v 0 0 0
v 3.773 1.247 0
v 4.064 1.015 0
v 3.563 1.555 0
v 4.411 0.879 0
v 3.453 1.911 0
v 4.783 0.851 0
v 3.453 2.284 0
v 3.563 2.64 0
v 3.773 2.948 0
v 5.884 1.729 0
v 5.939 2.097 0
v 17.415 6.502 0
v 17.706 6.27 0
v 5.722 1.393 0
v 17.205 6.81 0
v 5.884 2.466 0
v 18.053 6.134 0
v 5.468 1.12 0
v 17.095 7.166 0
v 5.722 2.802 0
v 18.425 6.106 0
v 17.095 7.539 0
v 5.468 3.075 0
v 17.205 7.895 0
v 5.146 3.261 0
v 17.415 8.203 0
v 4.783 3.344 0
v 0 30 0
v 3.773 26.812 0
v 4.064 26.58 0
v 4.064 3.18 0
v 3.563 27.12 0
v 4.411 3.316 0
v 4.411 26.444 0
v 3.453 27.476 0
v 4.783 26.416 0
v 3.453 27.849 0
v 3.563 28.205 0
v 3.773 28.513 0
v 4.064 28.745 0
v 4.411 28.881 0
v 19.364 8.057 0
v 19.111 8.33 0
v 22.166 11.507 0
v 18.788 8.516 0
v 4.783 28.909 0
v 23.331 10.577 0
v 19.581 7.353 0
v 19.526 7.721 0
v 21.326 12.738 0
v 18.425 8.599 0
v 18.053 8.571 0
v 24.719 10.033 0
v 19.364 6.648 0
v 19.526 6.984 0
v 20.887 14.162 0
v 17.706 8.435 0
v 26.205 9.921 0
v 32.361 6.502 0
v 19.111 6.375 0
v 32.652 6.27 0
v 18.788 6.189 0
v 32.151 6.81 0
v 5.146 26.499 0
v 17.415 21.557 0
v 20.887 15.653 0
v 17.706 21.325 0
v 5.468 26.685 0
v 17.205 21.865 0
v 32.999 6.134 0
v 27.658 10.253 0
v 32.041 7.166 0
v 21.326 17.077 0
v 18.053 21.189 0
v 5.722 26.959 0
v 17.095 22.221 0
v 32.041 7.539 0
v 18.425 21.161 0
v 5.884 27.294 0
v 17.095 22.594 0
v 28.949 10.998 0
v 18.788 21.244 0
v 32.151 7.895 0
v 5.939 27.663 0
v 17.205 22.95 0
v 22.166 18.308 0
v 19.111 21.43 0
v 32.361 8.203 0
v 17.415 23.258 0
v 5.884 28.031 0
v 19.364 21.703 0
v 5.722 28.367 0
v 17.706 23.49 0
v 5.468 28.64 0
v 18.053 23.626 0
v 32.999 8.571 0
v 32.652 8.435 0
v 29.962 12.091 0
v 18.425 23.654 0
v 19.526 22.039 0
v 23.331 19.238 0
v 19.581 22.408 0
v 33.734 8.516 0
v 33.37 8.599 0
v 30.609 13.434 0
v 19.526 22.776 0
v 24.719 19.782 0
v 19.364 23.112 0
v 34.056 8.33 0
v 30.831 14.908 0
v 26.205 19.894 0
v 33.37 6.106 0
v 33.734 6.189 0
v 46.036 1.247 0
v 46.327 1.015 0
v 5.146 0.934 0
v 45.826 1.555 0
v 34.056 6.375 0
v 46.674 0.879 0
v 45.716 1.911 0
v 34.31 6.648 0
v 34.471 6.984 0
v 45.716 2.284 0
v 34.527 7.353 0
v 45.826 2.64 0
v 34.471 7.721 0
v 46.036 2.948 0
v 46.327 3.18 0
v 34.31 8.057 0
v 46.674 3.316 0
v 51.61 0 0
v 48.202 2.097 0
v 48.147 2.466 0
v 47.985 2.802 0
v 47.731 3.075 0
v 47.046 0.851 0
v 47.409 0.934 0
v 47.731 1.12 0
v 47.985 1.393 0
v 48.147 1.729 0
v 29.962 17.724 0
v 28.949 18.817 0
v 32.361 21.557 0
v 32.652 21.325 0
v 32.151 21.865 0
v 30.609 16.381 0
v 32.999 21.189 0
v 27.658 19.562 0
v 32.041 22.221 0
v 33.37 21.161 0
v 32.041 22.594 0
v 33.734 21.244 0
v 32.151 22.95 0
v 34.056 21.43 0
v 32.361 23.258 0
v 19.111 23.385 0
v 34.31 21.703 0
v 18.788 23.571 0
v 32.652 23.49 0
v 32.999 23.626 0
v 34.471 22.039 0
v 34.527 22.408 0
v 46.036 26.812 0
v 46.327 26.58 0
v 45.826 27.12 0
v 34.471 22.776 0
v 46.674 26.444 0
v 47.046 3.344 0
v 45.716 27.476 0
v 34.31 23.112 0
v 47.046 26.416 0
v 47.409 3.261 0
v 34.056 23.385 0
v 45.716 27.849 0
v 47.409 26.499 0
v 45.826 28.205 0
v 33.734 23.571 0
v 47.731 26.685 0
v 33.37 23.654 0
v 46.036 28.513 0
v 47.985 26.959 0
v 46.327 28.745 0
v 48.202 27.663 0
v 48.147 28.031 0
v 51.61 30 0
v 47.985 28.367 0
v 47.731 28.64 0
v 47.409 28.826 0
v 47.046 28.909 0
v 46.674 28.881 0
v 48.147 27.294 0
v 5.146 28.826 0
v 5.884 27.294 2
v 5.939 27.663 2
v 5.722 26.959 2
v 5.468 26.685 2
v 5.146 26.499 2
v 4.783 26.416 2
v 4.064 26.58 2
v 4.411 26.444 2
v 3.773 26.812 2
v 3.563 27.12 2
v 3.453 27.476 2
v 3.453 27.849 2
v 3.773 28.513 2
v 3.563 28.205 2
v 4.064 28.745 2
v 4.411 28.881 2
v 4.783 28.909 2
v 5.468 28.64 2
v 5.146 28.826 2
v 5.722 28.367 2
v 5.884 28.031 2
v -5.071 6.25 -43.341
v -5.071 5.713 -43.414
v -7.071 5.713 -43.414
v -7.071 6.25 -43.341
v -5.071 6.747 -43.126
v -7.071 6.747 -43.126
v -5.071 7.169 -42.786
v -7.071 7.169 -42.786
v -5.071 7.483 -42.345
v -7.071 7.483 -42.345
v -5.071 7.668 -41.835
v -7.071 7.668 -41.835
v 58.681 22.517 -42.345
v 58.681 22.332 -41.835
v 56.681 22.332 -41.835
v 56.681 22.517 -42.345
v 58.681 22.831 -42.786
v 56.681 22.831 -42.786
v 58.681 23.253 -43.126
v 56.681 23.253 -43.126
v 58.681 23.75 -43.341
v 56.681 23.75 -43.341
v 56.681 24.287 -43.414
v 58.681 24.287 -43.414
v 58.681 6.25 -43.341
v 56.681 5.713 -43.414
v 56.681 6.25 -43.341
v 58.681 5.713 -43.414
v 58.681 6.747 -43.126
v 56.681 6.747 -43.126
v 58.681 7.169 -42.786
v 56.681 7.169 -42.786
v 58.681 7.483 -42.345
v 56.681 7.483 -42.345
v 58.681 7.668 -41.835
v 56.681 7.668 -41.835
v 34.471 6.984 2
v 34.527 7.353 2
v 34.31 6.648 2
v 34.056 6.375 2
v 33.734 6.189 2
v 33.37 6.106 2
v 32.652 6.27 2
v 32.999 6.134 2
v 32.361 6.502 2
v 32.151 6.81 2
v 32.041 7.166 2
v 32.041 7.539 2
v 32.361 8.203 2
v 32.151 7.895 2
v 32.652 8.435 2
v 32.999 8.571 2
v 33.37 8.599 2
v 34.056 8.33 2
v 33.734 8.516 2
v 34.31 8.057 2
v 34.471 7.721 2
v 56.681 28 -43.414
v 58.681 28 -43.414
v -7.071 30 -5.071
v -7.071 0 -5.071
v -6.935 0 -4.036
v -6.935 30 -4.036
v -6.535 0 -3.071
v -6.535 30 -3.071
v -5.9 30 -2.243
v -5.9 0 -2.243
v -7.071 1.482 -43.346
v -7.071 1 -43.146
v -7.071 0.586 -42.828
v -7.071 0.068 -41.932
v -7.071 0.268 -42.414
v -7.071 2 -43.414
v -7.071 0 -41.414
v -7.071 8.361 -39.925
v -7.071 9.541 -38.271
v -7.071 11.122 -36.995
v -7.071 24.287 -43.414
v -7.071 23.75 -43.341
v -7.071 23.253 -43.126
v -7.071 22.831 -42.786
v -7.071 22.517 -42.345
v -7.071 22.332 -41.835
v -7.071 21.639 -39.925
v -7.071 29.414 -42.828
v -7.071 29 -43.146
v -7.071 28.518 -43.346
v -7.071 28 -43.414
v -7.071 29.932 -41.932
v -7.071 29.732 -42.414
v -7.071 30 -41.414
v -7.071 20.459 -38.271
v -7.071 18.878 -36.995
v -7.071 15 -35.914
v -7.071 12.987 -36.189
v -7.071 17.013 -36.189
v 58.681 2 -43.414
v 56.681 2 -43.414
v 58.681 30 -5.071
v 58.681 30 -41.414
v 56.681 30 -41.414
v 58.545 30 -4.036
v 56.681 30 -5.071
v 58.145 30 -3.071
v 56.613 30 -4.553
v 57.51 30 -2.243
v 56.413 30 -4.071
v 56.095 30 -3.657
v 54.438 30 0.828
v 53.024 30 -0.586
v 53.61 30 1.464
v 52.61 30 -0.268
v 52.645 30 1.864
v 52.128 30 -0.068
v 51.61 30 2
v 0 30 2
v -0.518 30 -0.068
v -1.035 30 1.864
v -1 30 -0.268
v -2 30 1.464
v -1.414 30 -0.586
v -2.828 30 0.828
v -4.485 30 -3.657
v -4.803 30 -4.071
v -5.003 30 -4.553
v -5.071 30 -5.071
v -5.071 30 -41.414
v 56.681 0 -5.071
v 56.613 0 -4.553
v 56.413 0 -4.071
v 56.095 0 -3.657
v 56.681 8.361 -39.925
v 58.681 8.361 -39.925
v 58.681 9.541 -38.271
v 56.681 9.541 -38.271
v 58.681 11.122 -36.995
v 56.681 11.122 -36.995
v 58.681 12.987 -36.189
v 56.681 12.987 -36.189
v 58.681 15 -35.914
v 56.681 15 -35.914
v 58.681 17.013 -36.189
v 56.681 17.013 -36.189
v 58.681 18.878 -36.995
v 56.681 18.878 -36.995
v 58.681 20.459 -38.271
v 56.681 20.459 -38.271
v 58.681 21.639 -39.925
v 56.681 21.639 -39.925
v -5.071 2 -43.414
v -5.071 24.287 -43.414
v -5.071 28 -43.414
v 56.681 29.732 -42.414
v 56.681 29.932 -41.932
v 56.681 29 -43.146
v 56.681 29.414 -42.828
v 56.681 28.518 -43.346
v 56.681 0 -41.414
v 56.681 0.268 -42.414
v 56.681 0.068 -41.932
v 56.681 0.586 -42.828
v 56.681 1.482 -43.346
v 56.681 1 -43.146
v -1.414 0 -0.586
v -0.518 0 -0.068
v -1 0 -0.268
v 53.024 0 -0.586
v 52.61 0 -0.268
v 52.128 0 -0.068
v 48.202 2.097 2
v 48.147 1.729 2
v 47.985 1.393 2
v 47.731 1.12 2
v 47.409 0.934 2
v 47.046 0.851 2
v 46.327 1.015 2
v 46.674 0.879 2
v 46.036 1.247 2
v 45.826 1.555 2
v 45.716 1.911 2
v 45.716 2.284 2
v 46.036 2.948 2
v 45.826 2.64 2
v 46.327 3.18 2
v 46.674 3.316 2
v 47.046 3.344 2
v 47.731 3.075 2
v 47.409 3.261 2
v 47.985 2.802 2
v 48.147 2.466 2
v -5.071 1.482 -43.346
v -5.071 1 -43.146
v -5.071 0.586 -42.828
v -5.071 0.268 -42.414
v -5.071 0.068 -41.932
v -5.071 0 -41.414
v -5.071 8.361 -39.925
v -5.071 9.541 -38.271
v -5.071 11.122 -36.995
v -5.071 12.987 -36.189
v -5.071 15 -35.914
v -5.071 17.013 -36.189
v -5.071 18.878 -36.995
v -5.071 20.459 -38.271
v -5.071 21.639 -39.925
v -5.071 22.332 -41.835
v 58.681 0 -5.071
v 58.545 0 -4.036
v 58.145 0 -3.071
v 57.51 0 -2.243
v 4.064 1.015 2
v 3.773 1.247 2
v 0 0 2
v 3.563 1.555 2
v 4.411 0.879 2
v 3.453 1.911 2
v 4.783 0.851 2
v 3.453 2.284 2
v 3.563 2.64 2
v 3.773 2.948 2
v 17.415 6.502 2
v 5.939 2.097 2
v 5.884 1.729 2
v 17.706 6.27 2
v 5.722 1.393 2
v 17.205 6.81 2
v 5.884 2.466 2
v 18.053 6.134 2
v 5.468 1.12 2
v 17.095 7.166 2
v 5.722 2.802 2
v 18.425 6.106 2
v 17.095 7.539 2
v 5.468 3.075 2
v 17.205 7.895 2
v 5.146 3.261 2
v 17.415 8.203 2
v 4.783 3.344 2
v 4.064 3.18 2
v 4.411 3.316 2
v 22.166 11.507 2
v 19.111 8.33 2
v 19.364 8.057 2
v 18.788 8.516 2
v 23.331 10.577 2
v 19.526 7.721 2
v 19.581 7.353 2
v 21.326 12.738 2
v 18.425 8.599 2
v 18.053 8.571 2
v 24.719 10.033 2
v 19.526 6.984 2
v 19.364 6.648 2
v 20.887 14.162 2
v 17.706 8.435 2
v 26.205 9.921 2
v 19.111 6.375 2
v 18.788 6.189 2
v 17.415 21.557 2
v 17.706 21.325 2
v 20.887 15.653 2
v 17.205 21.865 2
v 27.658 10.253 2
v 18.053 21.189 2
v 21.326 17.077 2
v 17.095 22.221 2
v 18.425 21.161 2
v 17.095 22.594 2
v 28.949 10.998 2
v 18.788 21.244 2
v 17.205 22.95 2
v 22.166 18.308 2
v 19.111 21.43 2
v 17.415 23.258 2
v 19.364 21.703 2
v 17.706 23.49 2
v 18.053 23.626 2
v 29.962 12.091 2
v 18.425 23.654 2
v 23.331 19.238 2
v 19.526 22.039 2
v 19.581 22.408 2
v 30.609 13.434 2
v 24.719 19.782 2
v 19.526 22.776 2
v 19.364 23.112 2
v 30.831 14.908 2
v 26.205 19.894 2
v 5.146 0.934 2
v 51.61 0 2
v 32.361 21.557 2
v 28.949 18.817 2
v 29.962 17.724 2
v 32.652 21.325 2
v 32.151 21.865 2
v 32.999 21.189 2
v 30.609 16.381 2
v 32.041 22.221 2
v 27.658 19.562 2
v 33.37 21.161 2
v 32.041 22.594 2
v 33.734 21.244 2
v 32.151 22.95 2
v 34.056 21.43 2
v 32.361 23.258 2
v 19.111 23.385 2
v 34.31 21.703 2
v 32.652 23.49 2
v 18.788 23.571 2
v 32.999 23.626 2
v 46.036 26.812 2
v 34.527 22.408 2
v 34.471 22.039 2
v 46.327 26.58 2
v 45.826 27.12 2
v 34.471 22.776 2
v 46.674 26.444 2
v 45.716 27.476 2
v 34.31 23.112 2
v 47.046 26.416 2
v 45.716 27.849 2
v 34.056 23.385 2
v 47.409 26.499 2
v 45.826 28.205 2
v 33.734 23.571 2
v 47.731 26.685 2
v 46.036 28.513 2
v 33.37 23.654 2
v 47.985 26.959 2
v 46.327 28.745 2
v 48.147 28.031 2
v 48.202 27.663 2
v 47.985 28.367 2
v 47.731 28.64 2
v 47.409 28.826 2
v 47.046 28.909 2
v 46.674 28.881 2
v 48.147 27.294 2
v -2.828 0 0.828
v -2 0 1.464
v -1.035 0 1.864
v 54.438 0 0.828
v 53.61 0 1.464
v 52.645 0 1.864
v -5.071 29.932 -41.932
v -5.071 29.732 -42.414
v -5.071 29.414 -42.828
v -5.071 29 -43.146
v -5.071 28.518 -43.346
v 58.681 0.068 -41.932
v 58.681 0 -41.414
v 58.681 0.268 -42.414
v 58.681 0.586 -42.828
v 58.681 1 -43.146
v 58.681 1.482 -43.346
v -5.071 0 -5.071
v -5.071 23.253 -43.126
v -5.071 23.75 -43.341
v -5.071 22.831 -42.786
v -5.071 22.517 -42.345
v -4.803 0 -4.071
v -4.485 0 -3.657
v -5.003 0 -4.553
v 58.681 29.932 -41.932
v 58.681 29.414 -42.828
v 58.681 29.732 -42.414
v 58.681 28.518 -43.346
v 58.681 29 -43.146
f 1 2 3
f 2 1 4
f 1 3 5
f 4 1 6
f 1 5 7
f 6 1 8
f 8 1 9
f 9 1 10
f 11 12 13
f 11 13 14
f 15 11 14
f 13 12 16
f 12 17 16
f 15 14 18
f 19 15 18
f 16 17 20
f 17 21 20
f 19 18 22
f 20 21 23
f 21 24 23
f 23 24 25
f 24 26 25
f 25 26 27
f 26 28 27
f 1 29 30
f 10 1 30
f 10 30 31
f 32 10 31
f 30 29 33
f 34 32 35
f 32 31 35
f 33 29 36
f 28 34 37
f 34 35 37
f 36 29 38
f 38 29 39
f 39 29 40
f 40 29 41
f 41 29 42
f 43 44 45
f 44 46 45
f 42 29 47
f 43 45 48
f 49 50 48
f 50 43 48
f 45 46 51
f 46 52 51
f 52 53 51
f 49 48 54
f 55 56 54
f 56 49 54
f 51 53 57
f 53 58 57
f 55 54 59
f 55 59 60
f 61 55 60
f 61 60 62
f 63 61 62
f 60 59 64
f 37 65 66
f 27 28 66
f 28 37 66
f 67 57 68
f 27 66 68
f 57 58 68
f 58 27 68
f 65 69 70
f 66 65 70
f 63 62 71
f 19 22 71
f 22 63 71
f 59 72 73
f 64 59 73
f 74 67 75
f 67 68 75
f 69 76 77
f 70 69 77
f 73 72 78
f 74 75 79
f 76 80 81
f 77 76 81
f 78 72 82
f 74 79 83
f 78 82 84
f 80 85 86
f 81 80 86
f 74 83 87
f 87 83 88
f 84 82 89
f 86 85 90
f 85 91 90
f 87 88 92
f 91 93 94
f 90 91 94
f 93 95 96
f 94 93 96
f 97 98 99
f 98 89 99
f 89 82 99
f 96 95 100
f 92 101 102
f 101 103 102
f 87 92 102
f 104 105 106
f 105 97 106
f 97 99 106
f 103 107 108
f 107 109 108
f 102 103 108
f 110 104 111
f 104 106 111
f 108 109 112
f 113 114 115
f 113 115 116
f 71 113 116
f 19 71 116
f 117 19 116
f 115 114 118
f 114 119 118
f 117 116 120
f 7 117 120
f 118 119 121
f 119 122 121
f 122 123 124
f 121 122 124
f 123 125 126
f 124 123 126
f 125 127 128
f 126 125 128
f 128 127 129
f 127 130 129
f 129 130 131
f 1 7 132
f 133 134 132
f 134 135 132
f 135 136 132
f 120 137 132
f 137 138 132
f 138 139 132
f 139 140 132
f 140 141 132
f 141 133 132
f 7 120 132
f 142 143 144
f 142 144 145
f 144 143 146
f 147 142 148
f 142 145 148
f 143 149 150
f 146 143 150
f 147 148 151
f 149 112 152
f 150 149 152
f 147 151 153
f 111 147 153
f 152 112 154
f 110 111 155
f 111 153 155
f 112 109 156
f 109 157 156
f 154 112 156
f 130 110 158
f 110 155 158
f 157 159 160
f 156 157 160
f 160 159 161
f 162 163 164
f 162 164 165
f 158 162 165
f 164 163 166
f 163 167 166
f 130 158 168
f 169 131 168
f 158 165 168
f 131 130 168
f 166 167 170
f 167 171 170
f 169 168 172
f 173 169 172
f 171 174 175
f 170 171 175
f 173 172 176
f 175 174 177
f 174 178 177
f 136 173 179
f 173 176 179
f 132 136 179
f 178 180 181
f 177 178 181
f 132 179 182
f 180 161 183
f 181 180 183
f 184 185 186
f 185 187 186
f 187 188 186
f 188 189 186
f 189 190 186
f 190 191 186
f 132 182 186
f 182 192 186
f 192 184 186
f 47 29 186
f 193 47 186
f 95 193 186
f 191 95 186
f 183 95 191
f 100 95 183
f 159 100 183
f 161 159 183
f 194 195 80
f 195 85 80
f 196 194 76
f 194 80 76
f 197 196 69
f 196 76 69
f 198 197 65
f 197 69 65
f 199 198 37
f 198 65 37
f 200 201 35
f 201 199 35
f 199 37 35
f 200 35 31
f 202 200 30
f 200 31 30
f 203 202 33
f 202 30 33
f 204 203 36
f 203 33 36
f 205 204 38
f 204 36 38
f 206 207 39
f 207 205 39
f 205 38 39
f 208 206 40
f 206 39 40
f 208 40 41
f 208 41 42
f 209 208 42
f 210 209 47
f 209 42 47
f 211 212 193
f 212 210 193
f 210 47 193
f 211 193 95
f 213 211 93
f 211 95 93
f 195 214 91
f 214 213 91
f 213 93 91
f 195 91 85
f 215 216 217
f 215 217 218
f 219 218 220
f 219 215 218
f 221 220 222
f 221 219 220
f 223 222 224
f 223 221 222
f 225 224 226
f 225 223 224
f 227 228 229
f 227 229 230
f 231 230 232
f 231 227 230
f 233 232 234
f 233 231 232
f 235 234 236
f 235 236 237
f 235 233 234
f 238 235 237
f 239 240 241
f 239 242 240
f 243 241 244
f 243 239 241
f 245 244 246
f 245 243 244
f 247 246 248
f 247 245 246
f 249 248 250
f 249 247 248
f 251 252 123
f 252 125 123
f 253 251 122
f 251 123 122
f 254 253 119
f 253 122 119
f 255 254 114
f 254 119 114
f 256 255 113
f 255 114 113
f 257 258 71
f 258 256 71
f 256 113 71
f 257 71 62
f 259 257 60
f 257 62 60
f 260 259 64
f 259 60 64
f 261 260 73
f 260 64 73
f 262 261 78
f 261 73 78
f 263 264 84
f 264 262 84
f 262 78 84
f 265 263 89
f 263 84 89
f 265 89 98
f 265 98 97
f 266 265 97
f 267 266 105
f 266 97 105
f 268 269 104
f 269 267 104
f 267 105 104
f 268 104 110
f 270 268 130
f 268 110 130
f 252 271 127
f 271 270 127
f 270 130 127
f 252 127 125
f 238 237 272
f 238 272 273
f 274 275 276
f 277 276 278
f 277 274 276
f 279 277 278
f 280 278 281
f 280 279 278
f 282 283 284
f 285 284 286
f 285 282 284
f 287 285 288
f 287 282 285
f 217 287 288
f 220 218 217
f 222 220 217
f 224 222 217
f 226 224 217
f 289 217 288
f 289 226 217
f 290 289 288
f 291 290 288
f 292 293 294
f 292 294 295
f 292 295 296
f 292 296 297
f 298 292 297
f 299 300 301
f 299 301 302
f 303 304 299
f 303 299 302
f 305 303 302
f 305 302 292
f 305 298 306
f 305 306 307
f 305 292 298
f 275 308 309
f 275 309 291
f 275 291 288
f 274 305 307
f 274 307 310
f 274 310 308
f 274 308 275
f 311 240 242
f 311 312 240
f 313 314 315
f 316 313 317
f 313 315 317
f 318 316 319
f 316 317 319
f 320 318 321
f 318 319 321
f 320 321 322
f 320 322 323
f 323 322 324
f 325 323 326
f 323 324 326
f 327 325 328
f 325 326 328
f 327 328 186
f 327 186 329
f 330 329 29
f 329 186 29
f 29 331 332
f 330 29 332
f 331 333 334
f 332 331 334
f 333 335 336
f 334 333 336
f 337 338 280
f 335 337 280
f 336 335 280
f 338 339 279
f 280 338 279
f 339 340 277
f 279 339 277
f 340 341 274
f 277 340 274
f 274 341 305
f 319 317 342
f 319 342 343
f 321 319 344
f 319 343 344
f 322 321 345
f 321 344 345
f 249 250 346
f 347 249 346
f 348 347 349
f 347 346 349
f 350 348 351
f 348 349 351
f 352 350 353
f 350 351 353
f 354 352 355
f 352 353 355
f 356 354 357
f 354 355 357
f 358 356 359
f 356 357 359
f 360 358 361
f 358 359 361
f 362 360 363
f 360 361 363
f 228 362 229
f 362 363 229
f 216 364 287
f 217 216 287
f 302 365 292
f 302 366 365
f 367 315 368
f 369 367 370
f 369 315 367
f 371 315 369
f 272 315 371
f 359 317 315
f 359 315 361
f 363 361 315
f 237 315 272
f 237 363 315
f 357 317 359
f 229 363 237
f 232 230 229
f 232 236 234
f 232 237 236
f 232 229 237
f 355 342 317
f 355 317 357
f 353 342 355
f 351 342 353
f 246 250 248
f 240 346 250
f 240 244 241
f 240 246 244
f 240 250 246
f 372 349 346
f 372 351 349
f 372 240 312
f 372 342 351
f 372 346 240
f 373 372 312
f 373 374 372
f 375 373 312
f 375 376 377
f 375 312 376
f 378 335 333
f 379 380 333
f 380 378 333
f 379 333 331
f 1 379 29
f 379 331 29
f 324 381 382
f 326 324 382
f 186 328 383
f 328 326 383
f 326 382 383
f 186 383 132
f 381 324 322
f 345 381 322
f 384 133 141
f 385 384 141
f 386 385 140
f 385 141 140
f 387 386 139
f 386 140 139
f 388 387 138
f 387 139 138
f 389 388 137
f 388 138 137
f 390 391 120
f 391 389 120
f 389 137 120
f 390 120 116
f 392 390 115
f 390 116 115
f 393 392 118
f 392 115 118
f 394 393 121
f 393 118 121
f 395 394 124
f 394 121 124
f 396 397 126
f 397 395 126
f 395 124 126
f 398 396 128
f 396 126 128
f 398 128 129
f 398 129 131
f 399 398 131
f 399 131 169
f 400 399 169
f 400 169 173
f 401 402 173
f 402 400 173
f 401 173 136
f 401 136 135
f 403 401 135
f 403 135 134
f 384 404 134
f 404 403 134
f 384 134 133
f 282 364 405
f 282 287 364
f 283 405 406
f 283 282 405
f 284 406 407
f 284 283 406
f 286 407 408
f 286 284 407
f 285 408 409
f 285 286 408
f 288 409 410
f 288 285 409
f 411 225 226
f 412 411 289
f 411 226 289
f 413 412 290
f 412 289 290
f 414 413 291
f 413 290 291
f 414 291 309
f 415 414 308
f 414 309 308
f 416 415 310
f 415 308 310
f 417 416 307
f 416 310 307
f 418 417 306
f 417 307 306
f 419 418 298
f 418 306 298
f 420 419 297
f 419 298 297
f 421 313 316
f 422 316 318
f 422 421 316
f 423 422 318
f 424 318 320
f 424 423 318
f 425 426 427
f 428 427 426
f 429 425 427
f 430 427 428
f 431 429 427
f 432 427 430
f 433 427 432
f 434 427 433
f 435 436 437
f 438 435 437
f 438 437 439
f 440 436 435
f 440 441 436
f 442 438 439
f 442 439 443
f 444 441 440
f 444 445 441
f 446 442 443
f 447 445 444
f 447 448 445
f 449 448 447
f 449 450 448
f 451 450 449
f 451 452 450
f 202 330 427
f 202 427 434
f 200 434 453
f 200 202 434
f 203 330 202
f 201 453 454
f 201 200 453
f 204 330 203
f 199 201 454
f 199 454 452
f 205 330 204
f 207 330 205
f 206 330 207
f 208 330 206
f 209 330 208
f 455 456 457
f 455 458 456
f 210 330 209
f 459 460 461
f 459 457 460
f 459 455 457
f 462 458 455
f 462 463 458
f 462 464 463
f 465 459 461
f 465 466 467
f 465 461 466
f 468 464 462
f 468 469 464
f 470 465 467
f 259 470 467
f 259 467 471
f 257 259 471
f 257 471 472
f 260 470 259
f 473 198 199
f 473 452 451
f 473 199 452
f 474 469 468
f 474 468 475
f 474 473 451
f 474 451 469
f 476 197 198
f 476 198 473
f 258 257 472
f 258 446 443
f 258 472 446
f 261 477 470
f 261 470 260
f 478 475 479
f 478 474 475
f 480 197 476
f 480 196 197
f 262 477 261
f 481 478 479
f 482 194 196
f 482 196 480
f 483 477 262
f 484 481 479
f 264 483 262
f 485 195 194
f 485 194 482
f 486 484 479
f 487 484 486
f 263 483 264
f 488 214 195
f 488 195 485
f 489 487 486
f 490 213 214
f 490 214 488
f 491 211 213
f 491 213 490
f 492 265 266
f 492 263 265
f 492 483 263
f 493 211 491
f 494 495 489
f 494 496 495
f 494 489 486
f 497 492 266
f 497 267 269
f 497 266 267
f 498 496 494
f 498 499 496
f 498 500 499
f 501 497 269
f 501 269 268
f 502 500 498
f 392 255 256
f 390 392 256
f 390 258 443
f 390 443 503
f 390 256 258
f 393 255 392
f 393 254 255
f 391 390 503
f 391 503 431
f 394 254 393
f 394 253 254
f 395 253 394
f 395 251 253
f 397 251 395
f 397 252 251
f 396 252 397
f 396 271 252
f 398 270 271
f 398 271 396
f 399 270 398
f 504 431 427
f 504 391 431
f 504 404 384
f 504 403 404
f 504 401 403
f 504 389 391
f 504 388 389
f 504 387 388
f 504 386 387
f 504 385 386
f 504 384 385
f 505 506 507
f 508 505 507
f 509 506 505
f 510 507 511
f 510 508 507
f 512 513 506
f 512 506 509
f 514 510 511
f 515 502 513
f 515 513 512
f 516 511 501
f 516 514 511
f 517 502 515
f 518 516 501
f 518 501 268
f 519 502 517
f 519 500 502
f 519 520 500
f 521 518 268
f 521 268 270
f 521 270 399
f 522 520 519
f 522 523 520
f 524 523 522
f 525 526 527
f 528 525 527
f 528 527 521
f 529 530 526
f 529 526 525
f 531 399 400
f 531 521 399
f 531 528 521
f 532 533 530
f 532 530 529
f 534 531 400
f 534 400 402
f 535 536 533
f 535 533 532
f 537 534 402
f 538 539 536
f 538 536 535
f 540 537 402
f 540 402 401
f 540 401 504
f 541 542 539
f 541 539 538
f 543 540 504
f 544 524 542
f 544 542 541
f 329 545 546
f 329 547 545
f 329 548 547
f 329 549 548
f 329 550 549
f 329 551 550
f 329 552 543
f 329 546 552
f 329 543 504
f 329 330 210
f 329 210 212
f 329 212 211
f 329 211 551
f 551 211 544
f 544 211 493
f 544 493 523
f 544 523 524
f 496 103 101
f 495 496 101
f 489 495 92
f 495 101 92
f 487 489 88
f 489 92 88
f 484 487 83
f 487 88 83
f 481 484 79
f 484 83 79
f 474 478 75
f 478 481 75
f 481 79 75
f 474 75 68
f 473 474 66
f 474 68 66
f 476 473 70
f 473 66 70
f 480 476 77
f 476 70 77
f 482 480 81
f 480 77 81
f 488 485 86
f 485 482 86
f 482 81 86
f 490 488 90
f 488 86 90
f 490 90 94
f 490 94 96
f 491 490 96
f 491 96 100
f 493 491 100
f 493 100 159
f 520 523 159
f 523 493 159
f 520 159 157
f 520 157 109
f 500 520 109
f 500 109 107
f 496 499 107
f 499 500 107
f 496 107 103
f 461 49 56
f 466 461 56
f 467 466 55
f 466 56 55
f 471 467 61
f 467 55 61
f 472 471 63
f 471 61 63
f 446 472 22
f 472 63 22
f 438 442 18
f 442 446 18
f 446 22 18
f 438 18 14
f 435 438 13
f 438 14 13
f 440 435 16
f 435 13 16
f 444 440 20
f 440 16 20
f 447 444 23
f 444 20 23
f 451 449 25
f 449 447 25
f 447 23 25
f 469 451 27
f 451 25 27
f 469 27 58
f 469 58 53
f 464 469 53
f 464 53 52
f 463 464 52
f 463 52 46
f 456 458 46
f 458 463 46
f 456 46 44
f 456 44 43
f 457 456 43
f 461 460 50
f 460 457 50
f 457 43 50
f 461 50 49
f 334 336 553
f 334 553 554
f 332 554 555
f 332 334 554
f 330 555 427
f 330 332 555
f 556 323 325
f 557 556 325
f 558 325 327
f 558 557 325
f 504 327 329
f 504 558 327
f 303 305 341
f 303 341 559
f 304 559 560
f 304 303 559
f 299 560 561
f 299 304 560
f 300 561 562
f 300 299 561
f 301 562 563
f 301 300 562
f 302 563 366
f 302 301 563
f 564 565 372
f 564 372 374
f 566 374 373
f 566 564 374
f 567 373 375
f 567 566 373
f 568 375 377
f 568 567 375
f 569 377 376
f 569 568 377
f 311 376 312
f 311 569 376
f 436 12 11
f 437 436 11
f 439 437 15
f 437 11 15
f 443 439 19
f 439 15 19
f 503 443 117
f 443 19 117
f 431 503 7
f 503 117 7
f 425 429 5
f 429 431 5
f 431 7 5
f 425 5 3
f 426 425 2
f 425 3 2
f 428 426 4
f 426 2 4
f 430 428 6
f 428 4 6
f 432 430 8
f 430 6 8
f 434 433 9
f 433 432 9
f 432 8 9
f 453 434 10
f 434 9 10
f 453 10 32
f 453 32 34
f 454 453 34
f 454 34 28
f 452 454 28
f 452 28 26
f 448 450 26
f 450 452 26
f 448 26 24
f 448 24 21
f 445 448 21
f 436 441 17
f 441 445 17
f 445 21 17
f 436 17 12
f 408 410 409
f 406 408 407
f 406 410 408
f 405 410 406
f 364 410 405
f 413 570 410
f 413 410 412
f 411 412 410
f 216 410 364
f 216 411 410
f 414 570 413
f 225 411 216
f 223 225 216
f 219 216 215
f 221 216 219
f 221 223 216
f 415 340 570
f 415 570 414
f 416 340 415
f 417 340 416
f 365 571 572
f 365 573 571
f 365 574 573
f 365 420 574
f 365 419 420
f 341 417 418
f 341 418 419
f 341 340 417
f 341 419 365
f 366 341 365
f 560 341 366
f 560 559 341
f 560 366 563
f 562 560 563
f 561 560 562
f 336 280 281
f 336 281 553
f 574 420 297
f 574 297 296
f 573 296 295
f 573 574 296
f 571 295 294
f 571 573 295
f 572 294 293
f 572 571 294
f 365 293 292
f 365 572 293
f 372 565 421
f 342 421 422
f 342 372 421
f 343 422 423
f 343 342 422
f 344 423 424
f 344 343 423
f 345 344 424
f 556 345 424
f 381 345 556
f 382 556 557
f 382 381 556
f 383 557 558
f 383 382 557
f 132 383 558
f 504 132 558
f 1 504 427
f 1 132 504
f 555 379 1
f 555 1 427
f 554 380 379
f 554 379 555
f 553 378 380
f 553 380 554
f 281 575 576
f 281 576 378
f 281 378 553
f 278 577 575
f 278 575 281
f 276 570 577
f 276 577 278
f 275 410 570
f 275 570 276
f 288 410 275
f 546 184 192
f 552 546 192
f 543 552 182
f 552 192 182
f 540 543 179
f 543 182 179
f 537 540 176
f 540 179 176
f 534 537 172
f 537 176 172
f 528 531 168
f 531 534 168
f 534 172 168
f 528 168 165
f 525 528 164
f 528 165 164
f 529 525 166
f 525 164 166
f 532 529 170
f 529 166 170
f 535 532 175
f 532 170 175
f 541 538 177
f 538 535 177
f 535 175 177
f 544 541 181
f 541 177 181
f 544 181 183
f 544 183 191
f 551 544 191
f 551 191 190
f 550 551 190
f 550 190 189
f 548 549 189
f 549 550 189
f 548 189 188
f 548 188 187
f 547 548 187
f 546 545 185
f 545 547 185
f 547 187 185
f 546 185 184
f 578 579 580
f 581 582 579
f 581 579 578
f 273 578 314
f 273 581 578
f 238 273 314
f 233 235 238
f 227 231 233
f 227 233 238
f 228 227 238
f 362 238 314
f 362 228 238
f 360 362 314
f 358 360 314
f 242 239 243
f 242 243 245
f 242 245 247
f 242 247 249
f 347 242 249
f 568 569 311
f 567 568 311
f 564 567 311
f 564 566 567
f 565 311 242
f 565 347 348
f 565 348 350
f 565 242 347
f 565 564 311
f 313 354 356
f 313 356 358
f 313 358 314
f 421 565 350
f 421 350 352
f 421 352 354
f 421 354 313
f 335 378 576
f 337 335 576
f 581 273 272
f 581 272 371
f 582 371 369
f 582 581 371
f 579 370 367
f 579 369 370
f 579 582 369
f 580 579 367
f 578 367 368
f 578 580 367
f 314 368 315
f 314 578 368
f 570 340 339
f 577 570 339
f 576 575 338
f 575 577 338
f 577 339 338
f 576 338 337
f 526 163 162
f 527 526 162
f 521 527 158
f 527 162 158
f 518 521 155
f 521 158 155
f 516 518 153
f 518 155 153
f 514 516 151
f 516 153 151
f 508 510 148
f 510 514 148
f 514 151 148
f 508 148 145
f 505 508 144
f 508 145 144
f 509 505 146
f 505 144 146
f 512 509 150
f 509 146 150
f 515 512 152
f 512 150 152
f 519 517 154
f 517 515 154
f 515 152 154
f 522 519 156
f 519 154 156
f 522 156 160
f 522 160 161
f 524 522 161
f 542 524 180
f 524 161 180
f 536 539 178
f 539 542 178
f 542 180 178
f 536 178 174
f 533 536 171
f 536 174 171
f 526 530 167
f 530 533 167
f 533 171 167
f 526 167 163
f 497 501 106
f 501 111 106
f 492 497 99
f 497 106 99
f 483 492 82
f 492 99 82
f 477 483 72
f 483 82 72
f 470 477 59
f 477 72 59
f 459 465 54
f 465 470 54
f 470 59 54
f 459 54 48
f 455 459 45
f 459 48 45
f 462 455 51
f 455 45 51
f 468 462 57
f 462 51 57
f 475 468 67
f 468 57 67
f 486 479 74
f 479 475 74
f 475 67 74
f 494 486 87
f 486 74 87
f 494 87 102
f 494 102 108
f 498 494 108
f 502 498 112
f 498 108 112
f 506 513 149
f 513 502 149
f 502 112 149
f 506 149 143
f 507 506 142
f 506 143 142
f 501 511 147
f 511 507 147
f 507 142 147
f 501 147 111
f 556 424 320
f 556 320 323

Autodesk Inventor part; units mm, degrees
ref_plane "YZ Plane" through (0, 0, 0) normal (1, 0, 0) x (0, 1, 0)
ref_plane "XZ Plane" through (0, 0, 0) normal (0, 1, 0) x (-1, 0, 0)
ref_plane "XY Plane" through (0, 0, 0) normal (0, 0, 1) x (1, 0, 0)
sketch "스케치1" plane through (0, 0, 0) normal (0, 0, 1) x (1, 0, 0)
  circle A0 centre (25.8313, 14.9075) radius 5
  circle A1 centre (18.3313, 22.4075) radius 1.25
  circle A2 centre (18.3313, 7.3526) radius 1.25
  circle A3 centre (33.2769, 22.4075) radius 1.25
  circle A4 centre (46.9521, 27.6627) radius 1.25
  circle A5 centre (46.9521, 2.0974) radius 1.25
  circle A6 centre (33.2769, 7.3526) radius 1.25
  line L0 (25.8041, 29.8443) -> (25.8875, 29.8036)
  line L1 (0, 30) -> (0, 0)
  line L2 (0, 30) -> (51.61, 30)
  line L3 (51.61, 30) -> (51.61, 0)
  line L4 (51.61, 0) -> (0, 0)
  line L5 (0, 0) -> (0, 30)
  circle A7 centre (4.6891, 27.6627) radius 1.25
  circle A8 centre (4.6891, 2.0974) radius 1.25
  dimension "d2" = 10
  dimension "d5" = 2.5
  dimension "d26" = 51.61
extrude "판3" add sketch "스케치1" along normal blind 2
sketch "스케치3" plane through (53.0242, 0, -0.5858) normal (0.7071068, 0, 0.7071068) x (0, 1, 0)
  line L0 (30, 0) -> (0, 0)
  line L1 (0, 0) -> (0, -4.3431)
  line L2 (0, -4.3431) -> (30, -4.3431)
  line L3 (30, -4.3431) -> (30, 0)
edge flange "플랜지2" height 6 angle 45 thickness 2 bend radius 2 thickness toward (0.7071068, 0, 0.7071068) relief tear relief width 2 relief depth 1 corner gap 2 corner form 0 edges at (51.61, 15, 0) (0, 15, 0) wall of the first edge with corners at (53.0242, 30, -0.5858) (53.0242, 0, -0.5858) (56.0953, 0, -3.6569) (56.0953, 30, -3.6569)
bend "절곡부2"
corner "구석2"
sketch "스케치4" plane through (56.6811, 0, -5.0711) normal (1, 0, 0) x (0, 1, 0)
  line L0 (30, 0) -> (0, 0)
  line L1 (0, 0) -> (0, -38.3431)
  line L2 (0, -38.3431) -> (30, -38.3431)
  line L3 (30, -38.3431) -> (30, 0)
edge flange "플랜지3" height 40 angle 45 thickness 2 bend radius 2 thickness toward (1, 0, 0) relief tear relief width 2 relief depth 1 corner gap 2 corner form 0 edges at (56.0953, 15, -3.6569) (-4.4853, 15, -3.6569) wall of the first edge with corners at (56.6811, 30, -5.0711) (56.6811, 0, -5.0711) (56.6811, 0, -43.4142) (56.6811, 30, -43.4142)
bend "절곡부3"
corner "구석3"
sketch "스케치5" plane through (-7.0711, 0, -43.4142) normal (-1, 0, 0) x (0, 0, 1)
  line L0 (0, 30) -> (0, 0) projected
  circle A0 centre (0, 15) radius 7.5
  circle A1 centre (0, 15) radius 14.969
  line L1 (0, 15) -> (14.969, 15)
  point P0 (43.4142, 0)
  point P1 (0, 7.5)
  point P2 (0, 22.5)
  dimension "d48" = 15
extrude "돌출2" cut sketch "스케치5" against normal blind 66 contours A0 L1 L0 | L1 A0 L0
fillet "모깎기1" radius 2 8 edges at (57.6811, 0, -43.4142) (-6.0711, 0, -43.4142) (-6.0711, 7.5, -43.4142) (-6.0711, 22.5, -43.4142) (-6.0711, 30, -43.4142) (57.6811, 7.5, -43.4142) (57.6811, 22.5, -43.4142) (57.6811, 30, -43.4142)
equation "\"d28\" = BendReliefWidth"
equation "\"d29\" = BendReliefDepth"
equation "\"d30\" = MinimumRemnant"
equation "\"d31\" = TransitionRadius"
equation "\"d34\" = BendRadius"
equation "\"d35\" = CornerReliefSize"
equation "\"d38\" = BendReliefWidth"
equation "\"d39\" = BendReliefDepth"
equation "\"d40\" = MinimumRemnant"
equation "\"d41\" = TransitionRadius"
equation "\"d44\" = BendRadius"
equation "\"d45\" = CornerReliefSize"
equation "\"TransitionRadius\" = BendRadius"
equation "\"BendReliefWidth\" = 2"
equation "\"BendReliefDepth\" = 1"
equation "\"MinimumRemnant\" = 4"
equation "\"BendRadius\" = 2"
equation "\"CornerReliefSize\" = 8"
properties part number "motor_u" material "알루미늄 6061"
